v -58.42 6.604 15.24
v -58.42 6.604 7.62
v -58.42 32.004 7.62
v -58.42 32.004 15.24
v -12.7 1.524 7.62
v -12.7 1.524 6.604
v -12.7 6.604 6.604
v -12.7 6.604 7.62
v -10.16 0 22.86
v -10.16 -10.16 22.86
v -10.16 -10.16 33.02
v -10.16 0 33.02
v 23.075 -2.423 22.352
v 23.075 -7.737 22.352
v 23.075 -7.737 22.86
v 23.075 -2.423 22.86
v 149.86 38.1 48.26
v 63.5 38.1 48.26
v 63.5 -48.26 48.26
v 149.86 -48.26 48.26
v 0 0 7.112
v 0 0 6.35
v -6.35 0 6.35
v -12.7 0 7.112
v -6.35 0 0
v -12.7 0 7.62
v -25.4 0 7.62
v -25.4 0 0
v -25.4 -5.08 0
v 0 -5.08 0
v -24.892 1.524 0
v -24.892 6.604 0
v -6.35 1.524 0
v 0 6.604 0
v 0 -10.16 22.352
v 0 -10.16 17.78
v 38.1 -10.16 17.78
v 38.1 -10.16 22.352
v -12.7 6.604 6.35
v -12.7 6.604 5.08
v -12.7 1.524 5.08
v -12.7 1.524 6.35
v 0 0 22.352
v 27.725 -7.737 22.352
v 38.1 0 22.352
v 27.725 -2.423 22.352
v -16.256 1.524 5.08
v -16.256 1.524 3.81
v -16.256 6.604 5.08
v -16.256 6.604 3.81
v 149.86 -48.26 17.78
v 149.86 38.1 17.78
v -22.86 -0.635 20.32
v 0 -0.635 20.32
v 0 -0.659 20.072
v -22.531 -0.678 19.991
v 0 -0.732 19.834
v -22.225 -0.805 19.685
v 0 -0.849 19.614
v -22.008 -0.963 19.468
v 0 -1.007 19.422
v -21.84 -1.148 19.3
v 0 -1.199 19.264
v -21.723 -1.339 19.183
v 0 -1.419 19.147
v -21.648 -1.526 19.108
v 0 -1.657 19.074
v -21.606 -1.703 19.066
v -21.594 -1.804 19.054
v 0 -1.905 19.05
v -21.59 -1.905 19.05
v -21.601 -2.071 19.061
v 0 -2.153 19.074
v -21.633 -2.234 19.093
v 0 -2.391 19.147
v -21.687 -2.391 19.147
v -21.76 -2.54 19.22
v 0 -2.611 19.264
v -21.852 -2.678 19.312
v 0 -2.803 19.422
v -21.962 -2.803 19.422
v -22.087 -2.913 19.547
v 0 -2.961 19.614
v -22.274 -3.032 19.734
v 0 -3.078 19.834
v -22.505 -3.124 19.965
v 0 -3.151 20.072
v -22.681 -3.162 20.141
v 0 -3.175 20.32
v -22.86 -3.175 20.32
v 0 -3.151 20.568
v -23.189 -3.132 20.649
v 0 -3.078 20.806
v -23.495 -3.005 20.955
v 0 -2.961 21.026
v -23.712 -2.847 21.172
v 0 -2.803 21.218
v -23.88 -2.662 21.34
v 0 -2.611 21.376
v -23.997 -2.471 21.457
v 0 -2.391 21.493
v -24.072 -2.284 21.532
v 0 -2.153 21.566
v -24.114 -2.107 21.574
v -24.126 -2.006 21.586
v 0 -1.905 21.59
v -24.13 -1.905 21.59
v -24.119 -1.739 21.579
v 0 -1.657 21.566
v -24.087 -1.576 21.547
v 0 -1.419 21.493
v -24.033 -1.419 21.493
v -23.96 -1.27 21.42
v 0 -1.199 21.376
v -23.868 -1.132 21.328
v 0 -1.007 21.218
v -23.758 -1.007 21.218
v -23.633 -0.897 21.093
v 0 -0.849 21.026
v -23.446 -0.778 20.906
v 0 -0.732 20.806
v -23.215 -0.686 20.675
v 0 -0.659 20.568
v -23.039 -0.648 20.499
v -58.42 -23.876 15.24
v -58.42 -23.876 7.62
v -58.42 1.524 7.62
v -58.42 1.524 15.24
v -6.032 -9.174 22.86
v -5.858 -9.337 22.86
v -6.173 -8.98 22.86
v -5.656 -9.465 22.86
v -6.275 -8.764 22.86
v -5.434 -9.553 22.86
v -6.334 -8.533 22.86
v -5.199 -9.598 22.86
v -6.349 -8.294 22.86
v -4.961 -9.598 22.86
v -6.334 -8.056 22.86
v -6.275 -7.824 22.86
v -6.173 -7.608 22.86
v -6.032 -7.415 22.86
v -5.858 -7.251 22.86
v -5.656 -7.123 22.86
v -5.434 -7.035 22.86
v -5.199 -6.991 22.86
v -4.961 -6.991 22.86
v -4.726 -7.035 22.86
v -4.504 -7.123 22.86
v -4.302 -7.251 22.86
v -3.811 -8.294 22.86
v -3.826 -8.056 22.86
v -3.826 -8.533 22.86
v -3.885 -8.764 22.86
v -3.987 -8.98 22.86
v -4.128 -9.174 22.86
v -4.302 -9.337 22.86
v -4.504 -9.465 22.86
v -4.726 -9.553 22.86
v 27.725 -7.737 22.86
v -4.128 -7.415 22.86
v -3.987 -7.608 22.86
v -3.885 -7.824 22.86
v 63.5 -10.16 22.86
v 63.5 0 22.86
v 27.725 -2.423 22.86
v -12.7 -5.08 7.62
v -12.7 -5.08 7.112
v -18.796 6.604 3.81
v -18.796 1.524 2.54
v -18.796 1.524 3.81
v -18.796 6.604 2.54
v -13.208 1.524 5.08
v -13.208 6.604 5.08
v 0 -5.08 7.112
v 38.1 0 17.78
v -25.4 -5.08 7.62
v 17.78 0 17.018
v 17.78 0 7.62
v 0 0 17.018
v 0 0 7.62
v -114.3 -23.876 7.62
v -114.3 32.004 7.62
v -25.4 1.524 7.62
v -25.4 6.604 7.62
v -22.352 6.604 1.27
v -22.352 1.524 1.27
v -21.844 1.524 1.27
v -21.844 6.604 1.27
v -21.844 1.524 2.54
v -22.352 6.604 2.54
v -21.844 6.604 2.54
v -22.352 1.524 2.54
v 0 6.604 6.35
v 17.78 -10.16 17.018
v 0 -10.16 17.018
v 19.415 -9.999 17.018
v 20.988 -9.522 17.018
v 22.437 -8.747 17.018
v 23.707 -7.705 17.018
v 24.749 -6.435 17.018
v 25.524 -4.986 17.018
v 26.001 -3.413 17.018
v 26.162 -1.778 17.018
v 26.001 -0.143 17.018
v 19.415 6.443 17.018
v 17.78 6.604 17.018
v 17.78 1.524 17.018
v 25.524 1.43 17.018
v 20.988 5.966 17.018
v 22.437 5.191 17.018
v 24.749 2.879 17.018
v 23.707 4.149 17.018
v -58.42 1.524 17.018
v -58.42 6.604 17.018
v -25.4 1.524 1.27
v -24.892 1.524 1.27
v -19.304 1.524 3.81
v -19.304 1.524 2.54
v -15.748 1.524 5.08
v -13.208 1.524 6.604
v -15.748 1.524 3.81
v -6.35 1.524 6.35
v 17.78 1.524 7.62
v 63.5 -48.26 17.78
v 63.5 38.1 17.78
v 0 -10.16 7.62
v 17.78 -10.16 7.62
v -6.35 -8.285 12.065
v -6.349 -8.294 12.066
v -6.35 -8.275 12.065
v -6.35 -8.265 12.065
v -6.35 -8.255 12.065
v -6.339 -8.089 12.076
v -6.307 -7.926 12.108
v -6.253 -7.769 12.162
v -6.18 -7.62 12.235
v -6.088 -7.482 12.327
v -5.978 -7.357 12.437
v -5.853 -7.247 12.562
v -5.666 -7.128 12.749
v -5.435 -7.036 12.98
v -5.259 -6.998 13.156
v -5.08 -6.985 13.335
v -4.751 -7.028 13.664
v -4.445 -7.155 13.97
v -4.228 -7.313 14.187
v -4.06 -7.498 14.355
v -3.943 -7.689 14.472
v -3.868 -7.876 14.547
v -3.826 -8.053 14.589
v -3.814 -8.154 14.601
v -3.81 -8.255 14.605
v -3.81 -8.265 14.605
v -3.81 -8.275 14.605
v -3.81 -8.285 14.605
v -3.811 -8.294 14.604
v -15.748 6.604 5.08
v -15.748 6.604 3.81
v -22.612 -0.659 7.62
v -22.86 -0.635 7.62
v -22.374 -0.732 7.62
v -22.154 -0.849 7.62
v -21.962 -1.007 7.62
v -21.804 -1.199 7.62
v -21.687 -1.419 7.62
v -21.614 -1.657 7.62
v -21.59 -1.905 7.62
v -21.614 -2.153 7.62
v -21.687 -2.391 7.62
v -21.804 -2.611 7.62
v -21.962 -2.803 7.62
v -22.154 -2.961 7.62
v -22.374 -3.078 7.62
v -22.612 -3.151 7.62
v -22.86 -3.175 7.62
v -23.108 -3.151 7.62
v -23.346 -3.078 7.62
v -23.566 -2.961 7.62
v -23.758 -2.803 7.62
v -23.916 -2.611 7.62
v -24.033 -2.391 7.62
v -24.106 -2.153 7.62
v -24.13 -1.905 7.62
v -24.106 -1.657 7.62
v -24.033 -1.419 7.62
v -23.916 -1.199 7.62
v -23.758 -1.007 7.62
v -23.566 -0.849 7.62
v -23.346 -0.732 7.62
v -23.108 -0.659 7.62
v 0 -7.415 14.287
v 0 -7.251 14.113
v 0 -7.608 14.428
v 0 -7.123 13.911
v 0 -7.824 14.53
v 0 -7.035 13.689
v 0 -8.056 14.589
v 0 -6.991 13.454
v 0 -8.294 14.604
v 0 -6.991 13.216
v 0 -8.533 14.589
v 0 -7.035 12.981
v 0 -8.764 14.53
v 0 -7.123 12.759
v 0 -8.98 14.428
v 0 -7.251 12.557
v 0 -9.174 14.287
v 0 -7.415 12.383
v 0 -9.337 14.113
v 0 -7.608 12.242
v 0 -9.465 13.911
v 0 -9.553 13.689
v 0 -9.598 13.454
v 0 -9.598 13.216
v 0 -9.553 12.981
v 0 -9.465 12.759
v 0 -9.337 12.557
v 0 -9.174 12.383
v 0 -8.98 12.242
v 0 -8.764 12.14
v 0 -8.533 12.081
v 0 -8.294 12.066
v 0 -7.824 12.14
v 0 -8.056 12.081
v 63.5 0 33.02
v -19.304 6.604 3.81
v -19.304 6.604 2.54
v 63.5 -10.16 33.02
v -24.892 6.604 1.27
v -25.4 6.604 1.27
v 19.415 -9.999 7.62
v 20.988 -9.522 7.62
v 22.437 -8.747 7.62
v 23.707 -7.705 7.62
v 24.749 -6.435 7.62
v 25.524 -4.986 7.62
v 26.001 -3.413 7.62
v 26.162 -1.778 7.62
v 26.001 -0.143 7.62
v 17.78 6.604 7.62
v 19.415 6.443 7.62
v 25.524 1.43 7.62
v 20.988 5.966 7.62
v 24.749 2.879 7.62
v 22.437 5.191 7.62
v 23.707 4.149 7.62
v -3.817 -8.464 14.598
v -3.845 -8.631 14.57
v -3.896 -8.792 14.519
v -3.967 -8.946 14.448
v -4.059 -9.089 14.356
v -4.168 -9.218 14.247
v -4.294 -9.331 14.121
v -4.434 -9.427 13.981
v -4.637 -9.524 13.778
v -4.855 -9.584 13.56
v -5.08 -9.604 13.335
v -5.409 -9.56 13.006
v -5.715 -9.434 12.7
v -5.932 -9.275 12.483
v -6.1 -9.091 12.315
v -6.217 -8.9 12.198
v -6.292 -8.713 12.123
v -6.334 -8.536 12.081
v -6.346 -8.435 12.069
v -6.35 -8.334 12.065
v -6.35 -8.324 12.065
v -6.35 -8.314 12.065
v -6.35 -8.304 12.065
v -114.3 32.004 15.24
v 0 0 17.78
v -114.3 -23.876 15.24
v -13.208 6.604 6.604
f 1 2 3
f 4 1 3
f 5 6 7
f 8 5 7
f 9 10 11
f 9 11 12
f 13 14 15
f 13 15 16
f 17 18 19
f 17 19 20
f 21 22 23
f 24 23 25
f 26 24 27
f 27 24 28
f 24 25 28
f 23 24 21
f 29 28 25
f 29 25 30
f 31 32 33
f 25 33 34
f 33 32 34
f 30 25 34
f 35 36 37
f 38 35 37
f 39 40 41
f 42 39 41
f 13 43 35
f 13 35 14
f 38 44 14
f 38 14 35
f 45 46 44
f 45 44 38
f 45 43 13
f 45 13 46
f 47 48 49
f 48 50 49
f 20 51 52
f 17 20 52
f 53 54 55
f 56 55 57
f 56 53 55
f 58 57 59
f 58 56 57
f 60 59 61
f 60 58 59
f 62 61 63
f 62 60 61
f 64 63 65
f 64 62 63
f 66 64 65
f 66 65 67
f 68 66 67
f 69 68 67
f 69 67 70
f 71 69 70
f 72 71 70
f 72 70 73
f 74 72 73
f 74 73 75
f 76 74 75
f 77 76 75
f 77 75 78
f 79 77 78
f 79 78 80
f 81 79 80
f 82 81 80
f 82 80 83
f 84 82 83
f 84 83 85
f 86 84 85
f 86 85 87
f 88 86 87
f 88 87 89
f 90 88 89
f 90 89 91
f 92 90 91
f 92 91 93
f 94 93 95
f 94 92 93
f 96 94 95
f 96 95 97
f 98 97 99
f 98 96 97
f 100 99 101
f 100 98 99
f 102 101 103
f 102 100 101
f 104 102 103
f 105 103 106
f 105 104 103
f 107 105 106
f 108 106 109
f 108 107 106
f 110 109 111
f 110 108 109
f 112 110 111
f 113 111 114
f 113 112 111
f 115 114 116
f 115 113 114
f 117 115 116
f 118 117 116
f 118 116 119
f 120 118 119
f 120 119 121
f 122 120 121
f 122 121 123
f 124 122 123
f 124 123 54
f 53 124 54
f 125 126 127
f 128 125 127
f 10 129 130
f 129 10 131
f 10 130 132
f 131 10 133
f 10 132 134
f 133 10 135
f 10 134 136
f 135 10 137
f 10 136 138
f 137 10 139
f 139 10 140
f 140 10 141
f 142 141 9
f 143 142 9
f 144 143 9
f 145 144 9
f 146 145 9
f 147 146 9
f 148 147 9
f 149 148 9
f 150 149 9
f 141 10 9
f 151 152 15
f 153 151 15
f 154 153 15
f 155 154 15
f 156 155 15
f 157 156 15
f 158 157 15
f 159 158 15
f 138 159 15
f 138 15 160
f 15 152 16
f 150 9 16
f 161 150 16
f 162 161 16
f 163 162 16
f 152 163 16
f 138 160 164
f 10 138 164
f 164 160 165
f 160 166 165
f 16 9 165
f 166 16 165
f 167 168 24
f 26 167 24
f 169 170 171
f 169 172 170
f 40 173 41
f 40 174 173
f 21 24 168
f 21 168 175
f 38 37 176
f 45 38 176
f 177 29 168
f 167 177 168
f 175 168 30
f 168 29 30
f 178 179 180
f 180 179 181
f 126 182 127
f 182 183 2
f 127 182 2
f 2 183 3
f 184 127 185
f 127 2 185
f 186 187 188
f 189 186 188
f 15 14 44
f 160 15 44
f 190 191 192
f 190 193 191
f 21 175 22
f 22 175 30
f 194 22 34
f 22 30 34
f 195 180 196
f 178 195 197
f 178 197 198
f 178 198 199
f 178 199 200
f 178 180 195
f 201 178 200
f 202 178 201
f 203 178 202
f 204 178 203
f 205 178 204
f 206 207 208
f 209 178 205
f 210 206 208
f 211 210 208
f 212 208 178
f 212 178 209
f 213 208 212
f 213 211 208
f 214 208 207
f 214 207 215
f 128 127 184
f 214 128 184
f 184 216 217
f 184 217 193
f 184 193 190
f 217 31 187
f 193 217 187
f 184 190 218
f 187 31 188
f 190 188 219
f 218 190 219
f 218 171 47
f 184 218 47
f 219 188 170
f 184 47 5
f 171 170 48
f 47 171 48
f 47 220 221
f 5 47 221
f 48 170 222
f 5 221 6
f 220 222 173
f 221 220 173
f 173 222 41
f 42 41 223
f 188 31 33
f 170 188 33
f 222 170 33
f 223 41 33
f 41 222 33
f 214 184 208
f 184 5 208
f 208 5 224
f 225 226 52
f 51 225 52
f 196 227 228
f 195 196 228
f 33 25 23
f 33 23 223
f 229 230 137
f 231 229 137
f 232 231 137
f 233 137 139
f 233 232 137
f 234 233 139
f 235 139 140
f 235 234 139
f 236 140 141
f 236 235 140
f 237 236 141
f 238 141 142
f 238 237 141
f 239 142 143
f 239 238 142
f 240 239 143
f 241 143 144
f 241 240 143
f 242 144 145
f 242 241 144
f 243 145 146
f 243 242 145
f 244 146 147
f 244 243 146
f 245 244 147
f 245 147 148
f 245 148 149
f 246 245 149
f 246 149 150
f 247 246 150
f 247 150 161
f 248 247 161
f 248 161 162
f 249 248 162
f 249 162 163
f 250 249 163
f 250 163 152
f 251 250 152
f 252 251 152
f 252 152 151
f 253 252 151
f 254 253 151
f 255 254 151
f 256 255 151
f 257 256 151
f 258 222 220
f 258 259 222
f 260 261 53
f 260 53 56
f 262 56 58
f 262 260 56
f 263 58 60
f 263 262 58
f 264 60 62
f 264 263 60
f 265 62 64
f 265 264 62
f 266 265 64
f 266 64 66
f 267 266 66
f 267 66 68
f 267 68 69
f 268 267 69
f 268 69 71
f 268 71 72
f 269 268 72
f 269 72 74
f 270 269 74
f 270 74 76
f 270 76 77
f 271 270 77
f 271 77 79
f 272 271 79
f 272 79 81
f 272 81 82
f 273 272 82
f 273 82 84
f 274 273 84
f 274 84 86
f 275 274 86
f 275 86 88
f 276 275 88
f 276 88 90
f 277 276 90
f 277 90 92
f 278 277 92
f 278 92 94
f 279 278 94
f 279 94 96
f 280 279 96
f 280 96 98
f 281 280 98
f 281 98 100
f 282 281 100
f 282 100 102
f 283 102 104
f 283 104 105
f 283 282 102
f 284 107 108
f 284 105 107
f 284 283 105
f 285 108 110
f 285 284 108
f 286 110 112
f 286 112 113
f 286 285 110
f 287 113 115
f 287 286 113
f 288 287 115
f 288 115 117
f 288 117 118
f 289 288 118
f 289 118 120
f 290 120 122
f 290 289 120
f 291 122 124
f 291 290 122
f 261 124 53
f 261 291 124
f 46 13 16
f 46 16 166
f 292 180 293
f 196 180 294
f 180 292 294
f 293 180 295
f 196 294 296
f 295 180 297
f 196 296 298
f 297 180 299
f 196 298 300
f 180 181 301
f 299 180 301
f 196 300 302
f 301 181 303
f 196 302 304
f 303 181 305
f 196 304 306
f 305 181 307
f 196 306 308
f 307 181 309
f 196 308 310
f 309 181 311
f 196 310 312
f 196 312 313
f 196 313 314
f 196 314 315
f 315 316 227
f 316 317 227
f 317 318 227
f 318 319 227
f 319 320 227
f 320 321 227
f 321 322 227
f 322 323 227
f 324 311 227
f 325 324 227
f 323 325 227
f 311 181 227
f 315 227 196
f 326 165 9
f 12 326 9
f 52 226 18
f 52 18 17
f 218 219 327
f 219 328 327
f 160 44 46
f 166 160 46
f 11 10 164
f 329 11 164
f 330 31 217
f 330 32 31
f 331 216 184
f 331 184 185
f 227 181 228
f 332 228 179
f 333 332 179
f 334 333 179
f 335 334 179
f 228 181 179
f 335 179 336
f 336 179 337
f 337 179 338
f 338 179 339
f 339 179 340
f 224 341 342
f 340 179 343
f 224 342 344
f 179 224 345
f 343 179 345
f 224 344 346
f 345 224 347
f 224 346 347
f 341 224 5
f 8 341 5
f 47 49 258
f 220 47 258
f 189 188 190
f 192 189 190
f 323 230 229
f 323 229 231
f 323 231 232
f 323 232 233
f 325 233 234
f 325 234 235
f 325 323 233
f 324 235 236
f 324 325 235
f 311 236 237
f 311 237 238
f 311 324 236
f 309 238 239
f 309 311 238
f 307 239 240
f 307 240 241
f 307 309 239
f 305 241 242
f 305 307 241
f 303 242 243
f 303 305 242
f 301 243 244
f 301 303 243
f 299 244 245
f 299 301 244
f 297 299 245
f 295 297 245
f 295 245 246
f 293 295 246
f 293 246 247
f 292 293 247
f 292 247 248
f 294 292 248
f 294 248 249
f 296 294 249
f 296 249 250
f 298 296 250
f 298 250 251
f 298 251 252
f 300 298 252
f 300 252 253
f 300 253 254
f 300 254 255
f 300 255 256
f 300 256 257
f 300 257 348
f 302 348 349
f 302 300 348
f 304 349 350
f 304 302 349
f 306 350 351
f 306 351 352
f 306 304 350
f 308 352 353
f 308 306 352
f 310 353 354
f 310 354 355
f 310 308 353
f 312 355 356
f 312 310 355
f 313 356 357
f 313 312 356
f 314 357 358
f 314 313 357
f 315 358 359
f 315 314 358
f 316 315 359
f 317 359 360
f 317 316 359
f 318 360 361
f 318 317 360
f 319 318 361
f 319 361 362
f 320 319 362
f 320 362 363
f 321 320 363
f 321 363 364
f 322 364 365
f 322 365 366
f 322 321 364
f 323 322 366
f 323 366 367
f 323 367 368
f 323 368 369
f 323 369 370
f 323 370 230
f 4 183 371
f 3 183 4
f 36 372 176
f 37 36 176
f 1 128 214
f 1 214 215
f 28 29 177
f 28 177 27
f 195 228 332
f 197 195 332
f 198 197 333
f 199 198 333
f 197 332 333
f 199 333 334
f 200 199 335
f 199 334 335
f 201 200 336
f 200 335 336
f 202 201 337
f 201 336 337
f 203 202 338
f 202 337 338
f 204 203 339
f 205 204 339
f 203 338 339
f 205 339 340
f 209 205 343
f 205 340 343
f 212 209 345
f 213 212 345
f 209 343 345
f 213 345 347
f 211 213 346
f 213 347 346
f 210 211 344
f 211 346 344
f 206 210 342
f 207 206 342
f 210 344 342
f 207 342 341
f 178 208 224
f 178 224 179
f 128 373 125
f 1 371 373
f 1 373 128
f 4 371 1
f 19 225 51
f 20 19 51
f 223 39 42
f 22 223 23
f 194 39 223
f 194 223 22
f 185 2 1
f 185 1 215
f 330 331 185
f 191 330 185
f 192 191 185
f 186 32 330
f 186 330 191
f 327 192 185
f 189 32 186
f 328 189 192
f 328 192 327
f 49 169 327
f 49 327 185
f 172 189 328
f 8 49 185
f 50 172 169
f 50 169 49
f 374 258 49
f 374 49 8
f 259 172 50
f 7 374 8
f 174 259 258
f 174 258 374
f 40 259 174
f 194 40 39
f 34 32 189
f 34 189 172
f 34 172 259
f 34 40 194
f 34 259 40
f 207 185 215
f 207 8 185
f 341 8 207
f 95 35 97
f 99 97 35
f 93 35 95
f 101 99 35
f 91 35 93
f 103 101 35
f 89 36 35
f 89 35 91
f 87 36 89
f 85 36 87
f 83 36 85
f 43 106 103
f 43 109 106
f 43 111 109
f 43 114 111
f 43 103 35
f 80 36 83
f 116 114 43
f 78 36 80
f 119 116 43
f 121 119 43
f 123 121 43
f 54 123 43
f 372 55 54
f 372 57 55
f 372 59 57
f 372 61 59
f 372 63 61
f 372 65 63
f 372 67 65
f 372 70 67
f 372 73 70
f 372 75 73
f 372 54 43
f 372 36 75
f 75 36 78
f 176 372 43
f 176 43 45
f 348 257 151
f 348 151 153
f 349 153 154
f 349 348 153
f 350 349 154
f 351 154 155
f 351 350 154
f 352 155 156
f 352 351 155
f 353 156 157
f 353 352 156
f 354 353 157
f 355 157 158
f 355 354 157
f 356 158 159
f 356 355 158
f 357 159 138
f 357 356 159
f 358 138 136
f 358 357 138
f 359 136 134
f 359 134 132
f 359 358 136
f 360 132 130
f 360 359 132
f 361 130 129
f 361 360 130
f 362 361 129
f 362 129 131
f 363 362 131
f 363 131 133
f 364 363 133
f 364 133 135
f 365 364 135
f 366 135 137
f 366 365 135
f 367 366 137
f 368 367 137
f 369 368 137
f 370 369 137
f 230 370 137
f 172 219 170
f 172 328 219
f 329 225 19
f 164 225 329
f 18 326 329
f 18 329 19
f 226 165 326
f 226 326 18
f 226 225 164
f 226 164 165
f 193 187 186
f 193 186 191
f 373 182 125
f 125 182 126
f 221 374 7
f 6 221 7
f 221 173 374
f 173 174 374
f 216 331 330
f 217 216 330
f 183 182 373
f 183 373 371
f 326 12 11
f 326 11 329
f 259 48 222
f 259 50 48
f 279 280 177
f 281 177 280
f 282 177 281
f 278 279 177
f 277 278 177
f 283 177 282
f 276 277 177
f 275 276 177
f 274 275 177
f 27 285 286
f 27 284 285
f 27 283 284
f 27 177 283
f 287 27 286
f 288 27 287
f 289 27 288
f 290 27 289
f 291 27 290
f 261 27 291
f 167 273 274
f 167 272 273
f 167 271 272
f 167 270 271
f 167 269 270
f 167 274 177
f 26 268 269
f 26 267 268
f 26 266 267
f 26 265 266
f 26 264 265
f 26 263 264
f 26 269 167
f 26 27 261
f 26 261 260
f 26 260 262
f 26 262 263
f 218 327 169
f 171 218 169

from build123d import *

# Parameters (mm, degrees)
F2_W      = 76.2
F2_H      = 5.08
F3_DEPTH  = 9.398
F5_W      = 38.1
F5_H      = 10.16
F5_W_2    = 4.6505859673
F5_H_2    = 5.3134663665
F11_DEPTH = 4.572
F7_W      = 10.16
F7_H      = 10.16
F7_R      = 1.27
F7_W_2    = 63.5
F12_DEPTH = 10.16
F8_R      = 1.27
F2_R      = 1.27
F0_W      = 12.7
F0_H      = 5.08
F19_DEPTH = 7.62
F20_DEPTH = 7.112
F0_W_2    = 6.35
F0_H_2    = 1.524
F21_DEPTH = 6.35
F22_DEPTH = 7.62
F17_W     = 0.508
F17_H     = 1.524
F17_H_2   = 1.27
F23_DEPTH = 2.54
F24_W     = 86.36
F24_H     = 86.36
F25_DEPTH = 30.48
F26_W     = 55.88
F26_H     = 55.88
F27_DEPTH = 7.62
F28_DEPTH = 5.08


with BuildPart() as f3:
    # F2 (on offset) → F3 (new body)
    with BuildSketch(Plane.XY.offset(7.62)):
        with Locations((-20.32, 4.064)):
            Rectangle(F2_W, F2_H)
        Polygon((17.78, 0), (0, 0), (0, -5.08), (0, -10.16), (17.78, -10.16), (17.78, -5.08), align=None)
        with BuildLine():
            Line((17.78, 1.524), (17.78, 0))
            Line((17.78, 0), (17.78, -5.08))
            Line((17.78, -5.08), (17.78, -10.16))
            ThreePointArc((17.78, -10.16), (26.162, -1.778), (17.78, 6.604))
            Line((17.78, 6.604), (17.78, 1.524))
        make_face()
    extrude(amount=F3_DEPTH)



with BuildPart() as f11:
    # F5 (on offset) → F11 (new body)
    with BuildSketch(Plane.XY.offset(17.78)):
        with Locations((19.05, -5.08)):
            Rectangle(F5_W, F5_H)
        with Locations((25.4, -5.08)):
            Rectangle(F5_W_2, F5_H_2, mode=Mode.SUBTRACT)
    extrude(amount=F11_DEPTH)

    # F15: sweep along a path in F14
    with BuildLine(Plane.XZ.offset(1.905)) as f15_path:
        Line((0, 20.32), (-22.86, 20.32))
        Line((-22.86, 20.32), (-22.86, 7.62))
    # F8 (on Right) + F2 (on offset) → F15 (sweep)
    with BuildSketch(Plane.YZ):
        with Locations((-1.905, 20.32)):
            Circle(F8_R)
    with BuildSketch(Plane.XY.offset(7.62)):
        with Locations((-22.86, -1.905)):
            Circle(F2_R)
    sweep(path=f15_path.line, transition=Transition.RIGHT)


with BuildPart() as f12:
    # F7 (on offset) → F12 (new body)
    with BuildSketch(Plane.XY.offset(22.86)):
        with Locations((-5.08, -5.08)):
            Rectangle(F7_W, F7_H)
        with Locations((-5.08, -8.255)):
            Circle(F7_R, mode=Mode.SUBTRACT)
        with Locations((31.75, -5.08)):
            Rectangle(F7_W_2, F7_H)
        with Locations((-5.08, -8.255)):
            Circle(F7_R)
    extrude(amount=F12_DEPTH)


with BuildPart() as f3_1:
    add(f3.part)

    add(f12.part)  # F18 merges F12
    # F18: sweep along a path in F10
    with BuildLine(Plane.XZ.offset(8.255)) as f18_path:
        Line((-5.08, 22.86), (-5.08, 13.335))
        Line((-5.08, 13.335), (0, 13.335))
    # F8 (on Right) + F7 (on offset) → F18 (sweep)
    with BuildSketch(Plane.YZ):
        with Locations((-8.3337165415, 13.335)):
            Circle(F8_R)
    with BuildSketch(Plane.XY.offset(22.86)):
        with Locations((-5.08, -8.255)):
            Circle(F7_R)
    sweep(path=f18_path.line, transition=Transition.RIGHT)

    # F24 (on offset) → F25 (join)
    with BuildSketch(Plane.XY.offset(17.78)):
        with Locations((106.68, -5.08)):
            Rectangle(F24_W, F24_H)
    extrude(amount=F25_DEPTH)


    add(f11.part)  # F27 merges F11


with BuildPart() as f19:
    # F0 (on Top) → F19 (new body)
    with BuildSketch(Plane.XY):
        with Locations((-19.05, -2.54)):
            Rectangle(F0_W, F0_H)
    extrude(amount=F19_DEPTH)

    # F0 (on Top) → F20 (join)
    with BuildSketch(Plane.XY):
        Polygon((0, -5.08), (0, 0), (-6.35, 0), (-12.7, 0), (-12.7, -5.08), align=None)
    extrude(amount=F20_DEPTH)

    # F0 (on Top) → F21 (join)
    with BuildSketch(Plane.XY):
        with Locations((-3.175, 0.762)):
            Rectangle(F0_W_2, F0_H_2)
        Polygon((-6.35, 1.524), (0, 1.524), (0, 6.604), (-12.7, 6.604), (-12.7, 1.524), align=None)
    extrude(amount=F21_DEPTH)


with BuildPart() as f22:
    # F0 (on Top) → F22 (new body)
    with BuildSketch(Plane.XY):
        with Locations((-19.05, 4.064)):
            Rectangle(F0_W, F0_H)
    extrude(amount=F22_DEPTH)

    # F17 (on offset) → F23 (cut, symmetric)
    with BuildSketch(Plane.XZ.offset(-4.064)):
        with Locations((-12.954, 5.842)):
            Rectangle(F17_W, F17_H)
        with Locations((-25.146, 0.635)):
            Rectangle(F17_W, F17_H_2)
        with Locations((-19.05, 3.175)):
            Rectangle(F17_W, F17_H_2)
        with Locations((-16.002, 4.445)):
            Rectangle(F17_W, F17_H_2)
        with Locations((-22.098, 1.905)):
            Rectangle(F17_W, F17_H_2)
    extrude(amount=F23_DEPTH, both=True, mode=Mode.SUBTRACT)


with BuildPart() as f3_2:
    add(f3_1.part)

    add(f19.part)  # F27 merges F19

    add(f22.part)  # F27 merges F22
    # F26 (on offset) → F27 (join)
    with BuildSketch(Plane.XY.offset(7.62)):
        with Locations((-86.36, 4.064)):
            Rectangle(F26_W, F26_H)
    extrude(amount=F27_DEPTH)

    # F5 (on offset) → F28 (join)
    with BuildSketch(Plane.XY.offset(17.78)):
        with Locations((25.4, -5.08)):
            Rectangle(F5_W_2, F5_H_2)
    extrude(amount=F28_DEPTH)


solid = f3_2.part
